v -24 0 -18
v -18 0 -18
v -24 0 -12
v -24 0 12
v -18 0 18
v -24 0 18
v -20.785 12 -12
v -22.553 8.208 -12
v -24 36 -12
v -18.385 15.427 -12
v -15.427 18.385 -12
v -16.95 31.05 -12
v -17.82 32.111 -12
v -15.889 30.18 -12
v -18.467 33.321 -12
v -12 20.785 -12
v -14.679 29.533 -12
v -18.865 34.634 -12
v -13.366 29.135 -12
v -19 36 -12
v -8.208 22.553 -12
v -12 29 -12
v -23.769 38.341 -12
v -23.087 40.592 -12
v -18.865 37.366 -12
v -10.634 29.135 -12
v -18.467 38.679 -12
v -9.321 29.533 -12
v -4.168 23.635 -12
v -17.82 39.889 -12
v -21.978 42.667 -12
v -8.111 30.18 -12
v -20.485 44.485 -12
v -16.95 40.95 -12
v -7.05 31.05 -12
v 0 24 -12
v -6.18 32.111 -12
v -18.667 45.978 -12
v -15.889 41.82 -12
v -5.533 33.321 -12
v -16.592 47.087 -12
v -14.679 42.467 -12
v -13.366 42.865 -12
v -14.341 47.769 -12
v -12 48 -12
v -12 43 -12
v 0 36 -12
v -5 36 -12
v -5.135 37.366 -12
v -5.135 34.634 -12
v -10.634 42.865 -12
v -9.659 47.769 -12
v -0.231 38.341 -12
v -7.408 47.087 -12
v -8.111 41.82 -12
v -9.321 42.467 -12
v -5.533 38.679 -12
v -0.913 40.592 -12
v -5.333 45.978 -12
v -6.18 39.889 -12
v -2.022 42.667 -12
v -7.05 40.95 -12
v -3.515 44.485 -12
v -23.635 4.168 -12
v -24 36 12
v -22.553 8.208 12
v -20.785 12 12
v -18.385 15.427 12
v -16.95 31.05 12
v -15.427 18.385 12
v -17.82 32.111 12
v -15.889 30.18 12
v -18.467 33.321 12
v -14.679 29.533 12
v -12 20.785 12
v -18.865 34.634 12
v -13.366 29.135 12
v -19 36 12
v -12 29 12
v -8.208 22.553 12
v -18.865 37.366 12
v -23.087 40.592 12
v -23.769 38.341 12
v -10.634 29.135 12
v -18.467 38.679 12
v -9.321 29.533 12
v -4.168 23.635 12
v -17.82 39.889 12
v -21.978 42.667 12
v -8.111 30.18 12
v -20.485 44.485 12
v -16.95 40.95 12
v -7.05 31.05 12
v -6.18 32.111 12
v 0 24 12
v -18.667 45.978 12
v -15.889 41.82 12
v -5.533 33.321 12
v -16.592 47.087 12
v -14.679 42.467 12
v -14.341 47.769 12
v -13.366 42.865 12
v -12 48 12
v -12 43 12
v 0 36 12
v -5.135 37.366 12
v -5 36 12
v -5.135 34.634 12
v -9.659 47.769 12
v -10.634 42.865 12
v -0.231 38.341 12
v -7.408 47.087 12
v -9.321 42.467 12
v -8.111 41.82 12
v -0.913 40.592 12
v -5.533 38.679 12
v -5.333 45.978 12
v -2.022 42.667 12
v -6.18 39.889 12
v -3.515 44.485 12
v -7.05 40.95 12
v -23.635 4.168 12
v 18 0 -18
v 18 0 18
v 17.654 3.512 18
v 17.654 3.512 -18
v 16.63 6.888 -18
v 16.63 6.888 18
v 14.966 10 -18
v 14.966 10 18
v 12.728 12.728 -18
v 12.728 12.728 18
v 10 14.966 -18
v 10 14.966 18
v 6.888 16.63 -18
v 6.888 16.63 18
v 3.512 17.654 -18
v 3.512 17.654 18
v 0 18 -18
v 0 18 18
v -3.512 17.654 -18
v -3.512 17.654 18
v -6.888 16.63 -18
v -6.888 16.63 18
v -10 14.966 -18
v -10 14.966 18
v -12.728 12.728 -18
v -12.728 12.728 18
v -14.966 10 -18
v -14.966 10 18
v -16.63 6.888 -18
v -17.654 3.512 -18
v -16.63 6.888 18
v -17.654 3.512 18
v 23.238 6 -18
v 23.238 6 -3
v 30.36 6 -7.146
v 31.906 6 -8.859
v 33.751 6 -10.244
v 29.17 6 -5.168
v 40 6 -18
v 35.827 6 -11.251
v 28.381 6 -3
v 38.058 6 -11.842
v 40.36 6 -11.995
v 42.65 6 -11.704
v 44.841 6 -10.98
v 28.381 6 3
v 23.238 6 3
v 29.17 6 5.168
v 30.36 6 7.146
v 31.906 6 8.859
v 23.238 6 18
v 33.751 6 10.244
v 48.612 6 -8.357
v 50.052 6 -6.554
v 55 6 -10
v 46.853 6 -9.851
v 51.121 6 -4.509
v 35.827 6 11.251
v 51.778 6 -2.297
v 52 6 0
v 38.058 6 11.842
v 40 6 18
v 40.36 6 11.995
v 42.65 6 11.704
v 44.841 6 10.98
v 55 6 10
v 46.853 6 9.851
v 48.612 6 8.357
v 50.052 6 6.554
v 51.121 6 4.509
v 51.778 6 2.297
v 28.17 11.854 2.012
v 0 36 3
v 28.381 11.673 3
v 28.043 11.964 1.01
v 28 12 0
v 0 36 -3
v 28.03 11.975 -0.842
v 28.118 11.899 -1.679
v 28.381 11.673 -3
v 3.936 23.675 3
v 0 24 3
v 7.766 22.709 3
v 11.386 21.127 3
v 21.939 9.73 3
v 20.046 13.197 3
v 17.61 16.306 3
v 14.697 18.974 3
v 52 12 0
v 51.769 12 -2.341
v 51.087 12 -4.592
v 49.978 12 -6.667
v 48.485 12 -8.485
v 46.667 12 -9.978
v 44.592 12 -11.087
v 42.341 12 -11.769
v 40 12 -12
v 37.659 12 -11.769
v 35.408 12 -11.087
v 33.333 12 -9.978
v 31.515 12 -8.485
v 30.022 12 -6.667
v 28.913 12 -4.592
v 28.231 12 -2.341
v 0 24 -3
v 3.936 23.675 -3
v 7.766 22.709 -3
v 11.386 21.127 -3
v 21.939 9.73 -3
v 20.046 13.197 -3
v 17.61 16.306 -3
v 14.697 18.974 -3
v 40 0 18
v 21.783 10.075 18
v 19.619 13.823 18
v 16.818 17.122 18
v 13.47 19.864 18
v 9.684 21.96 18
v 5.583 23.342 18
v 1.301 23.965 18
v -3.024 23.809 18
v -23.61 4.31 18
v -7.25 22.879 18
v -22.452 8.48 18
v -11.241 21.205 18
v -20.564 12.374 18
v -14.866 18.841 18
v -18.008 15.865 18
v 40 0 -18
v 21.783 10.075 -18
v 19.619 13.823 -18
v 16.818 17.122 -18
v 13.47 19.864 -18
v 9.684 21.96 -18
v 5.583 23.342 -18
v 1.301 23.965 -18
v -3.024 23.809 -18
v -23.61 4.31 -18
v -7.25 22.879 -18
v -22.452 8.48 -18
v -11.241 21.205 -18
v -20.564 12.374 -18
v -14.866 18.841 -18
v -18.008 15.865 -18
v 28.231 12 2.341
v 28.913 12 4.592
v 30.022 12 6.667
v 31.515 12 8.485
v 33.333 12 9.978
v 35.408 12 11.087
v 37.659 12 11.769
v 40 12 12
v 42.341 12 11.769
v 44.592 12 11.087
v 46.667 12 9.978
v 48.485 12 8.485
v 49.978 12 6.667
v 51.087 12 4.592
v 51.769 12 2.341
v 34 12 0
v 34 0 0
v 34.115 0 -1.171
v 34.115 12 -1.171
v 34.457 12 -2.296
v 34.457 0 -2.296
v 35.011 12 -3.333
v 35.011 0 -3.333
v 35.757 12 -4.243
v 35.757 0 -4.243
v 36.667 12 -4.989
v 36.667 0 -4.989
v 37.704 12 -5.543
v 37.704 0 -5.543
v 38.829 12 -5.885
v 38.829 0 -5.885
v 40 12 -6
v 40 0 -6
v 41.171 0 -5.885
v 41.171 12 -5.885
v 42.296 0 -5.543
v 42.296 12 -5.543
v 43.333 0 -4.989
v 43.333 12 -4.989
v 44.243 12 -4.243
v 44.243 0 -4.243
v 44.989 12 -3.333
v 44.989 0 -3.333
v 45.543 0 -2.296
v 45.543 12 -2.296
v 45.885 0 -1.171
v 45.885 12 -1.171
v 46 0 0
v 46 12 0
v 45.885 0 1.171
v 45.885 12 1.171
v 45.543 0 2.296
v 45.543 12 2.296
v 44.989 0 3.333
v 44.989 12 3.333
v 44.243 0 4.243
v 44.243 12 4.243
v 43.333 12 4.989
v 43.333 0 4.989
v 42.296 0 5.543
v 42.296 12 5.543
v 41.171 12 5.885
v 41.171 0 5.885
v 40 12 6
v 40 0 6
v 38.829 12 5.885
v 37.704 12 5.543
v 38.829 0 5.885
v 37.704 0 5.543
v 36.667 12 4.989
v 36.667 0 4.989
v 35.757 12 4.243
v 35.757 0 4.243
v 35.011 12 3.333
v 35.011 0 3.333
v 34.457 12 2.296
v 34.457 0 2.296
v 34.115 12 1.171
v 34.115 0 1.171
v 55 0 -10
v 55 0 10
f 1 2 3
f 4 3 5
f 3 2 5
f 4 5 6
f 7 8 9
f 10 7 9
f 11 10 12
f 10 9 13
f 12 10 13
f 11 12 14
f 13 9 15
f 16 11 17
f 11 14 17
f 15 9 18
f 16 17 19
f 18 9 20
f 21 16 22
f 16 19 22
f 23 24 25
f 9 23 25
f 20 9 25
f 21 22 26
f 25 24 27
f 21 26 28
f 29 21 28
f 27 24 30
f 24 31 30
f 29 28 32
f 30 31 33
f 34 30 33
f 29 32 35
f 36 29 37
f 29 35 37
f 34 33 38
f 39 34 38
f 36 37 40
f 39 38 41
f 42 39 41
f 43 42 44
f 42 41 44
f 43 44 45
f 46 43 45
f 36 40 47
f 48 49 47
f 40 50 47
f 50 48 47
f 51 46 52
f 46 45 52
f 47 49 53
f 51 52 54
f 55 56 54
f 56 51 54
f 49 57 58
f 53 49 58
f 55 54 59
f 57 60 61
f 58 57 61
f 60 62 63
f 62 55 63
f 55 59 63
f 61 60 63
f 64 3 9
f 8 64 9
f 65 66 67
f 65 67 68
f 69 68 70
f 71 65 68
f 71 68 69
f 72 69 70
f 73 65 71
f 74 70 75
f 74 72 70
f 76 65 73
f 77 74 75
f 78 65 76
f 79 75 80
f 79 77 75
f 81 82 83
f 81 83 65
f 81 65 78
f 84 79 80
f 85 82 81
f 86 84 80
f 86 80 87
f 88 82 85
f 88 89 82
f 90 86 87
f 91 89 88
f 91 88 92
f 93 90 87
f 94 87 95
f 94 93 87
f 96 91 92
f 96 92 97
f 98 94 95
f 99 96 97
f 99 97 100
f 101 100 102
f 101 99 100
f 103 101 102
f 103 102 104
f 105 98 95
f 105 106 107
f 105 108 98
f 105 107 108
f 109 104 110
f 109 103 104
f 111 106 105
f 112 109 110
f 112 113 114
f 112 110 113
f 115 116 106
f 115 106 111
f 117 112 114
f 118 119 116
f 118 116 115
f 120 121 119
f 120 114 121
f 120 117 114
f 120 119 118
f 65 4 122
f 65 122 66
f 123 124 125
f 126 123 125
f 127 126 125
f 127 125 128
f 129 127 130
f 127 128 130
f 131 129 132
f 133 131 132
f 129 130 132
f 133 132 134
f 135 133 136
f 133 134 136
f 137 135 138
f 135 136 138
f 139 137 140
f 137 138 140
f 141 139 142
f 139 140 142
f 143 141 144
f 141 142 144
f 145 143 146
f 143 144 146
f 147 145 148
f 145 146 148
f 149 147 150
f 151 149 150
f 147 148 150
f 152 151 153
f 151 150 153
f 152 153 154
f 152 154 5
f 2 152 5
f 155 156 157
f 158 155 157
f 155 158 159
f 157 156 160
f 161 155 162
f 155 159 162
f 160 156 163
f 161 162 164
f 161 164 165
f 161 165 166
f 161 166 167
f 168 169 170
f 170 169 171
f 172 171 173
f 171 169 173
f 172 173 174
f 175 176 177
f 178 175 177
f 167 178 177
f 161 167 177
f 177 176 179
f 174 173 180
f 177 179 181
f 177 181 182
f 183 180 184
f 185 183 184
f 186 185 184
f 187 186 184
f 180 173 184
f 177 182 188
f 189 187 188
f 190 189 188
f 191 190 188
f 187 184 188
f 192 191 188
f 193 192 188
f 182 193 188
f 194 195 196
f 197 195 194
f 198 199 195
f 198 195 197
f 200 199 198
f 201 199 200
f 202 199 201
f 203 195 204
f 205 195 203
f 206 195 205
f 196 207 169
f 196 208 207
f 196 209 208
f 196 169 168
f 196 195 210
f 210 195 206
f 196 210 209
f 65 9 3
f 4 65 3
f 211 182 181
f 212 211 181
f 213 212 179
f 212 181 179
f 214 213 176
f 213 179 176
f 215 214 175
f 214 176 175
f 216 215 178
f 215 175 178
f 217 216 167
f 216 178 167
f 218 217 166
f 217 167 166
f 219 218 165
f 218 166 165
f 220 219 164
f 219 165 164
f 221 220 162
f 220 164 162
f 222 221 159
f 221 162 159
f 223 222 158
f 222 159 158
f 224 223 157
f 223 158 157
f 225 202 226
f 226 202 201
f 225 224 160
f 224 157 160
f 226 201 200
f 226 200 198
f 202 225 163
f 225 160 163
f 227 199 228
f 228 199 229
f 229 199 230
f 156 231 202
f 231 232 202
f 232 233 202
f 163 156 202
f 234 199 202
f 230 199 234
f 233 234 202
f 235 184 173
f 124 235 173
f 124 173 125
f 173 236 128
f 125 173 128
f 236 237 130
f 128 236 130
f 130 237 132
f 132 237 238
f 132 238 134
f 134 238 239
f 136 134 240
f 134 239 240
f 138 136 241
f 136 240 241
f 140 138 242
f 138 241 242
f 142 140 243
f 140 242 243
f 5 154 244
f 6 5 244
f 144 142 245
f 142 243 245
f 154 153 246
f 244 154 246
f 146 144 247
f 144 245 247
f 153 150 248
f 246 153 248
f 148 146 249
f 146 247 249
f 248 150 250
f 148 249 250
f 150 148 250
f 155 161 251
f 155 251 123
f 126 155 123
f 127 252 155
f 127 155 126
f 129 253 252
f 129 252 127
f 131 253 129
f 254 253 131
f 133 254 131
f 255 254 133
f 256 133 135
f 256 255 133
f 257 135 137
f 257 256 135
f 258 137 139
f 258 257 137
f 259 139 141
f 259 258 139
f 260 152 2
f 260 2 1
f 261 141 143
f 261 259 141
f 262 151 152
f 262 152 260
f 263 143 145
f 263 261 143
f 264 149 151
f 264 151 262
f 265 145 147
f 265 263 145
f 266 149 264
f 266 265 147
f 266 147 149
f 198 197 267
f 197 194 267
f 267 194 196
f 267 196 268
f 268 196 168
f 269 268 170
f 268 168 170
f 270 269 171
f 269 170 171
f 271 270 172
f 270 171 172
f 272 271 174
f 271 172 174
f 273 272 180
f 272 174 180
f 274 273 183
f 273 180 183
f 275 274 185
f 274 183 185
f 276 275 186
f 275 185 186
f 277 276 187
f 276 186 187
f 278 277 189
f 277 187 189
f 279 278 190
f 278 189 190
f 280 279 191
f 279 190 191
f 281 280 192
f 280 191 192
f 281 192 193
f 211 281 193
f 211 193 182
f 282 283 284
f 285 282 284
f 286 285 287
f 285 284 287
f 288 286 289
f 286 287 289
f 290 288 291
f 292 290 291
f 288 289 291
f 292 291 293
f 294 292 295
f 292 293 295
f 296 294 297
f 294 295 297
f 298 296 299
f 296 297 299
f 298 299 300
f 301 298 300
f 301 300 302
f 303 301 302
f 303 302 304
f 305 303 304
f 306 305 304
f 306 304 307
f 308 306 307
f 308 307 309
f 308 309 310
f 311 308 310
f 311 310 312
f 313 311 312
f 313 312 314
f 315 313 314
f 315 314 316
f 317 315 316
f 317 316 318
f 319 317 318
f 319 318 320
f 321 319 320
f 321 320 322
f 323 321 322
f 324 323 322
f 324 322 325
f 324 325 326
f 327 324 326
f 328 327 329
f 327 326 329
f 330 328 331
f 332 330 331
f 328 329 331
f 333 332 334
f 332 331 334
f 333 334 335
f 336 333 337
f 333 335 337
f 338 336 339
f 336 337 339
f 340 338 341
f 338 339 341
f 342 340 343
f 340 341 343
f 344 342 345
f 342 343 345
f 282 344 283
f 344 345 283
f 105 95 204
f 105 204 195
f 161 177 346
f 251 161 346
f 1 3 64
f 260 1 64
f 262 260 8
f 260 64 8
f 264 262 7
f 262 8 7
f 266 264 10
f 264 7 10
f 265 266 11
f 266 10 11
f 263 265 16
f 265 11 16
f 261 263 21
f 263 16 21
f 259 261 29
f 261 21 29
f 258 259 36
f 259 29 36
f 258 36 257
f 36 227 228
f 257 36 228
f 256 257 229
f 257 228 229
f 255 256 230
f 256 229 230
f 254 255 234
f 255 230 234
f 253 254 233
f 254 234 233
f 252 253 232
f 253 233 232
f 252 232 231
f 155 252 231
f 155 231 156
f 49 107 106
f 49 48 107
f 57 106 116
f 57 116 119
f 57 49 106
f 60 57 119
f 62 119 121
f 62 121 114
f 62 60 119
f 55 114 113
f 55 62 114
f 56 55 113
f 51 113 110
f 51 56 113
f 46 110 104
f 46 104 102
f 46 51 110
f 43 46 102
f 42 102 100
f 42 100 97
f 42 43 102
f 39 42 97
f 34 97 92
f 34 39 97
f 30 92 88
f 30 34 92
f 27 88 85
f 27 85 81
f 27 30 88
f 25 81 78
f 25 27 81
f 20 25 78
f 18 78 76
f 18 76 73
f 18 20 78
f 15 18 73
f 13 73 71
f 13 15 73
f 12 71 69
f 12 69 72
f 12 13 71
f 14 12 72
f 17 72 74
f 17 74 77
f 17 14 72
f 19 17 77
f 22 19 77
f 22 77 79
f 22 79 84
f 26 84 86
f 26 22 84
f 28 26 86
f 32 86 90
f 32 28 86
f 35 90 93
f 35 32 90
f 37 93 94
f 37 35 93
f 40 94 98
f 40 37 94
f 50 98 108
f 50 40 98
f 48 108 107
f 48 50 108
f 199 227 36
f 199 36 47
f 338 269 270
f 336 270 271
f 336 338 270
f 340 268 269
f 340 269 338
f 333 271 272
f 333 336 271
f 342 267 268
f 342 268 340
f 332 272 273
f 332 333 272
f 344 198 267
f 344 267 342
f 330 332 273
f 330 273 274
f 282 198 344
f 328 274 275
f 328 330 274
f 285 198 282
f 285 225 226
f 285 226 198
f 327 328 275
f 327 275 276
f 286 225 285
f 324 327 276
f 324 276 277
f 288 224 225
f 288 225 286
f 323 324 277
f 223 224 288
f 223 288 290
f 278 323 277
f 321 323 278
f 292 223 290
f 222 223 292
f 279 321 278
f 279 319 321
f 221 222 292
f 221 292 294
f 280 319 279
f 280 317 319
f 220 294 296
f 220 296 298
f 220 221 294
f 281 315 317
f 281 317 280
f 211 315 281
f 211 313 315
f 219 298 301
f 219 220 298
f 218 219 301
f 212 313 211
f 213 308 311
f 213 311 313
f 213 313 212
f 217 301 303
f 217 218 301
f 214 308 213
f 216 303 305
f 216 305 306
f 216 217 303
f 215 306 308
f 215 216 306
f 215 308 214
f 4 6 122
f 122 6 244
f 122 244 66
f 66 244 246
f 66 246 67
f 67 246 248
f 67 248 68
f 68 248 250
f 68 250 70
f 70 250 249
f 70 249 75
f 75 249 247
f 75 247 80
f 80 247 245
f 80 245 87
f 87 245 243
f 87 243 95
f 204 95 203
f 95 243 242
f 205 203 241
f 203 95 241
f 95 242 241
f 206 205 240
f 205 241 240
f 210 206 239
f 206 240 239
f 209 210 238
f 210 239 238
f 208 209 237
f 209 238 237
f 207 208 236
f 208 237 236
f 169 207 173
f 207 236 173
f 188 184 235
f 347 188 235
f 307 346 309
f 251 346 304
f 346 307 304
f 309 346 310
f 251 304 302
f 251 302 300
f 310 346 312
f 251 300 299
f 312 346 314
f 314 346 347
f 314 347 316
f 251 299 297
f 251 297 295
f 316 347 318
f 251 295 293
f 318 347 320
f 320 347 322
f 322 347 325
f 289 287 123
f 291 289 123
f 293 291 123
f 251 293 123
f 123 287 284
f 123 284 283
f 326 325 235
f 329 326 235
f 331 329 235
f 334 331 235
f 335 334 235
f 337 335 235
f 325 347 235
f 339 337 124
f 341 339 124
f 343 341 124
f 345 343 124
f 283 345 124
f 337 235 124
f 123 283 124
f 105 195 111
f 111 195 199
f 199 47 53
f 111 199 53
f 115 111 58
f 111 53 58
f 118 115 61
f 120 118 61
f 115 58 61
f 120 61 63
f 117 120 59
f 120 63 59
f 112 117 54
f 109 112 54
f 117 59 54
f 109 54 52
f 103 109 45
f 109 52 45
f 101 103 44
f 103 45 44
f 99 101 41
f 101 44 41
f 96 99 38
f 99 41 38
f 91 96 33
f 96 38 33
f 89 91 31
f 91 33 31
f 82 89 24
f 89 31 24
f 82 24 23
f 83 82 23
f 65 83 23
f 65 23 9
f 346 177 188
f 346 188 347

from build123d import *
from build123d.topology import SkipClean

# Parameters (mm, degrees)
BOSS_EXTRUDE1_DEPTH        = 18
SKETCH1_3_R                = 12
SKETCH1_3_R_2              = 7
BOSS_EXTRUDE2_DEPTH        = 12
SKETCH2_R                  = 12
BOSS_EXTRUDE3_DEPTH        = 6
RIB1_REACH                 = 77.186
SKETCH3_WALL_W             = 189.251047722
SKETCH3_WALL_H             = 6
CHAMFER1_SIZE              = 8
CHAMFER1_SIZE2             = 15
CHAMFER2_SIZE              = 15
CHAMFER2_SIZE2             = 8
F_12_0MM_DOWEL_HOLE1_D     = 12
F_12_0MM_DOWEL_HOLE1_DEPTH = 30
F_12_0MM_DOWEL_HOLE1_TIP   = 3.605163714


with BuildPart() as part:
    # Sketch1 → Boss-Extrude1 (new, symmetric)
    with BuildSketch(Plane.XY):
        with BuildLine():
            ThreePointArc((18, 0), (0, 18), (-18, 0))
            Line((-18, 0), (-24, 0))
            ThreePointArc((-24, 0), (-3.02410302, 23.80871271), (23.237900077, 6))
            Line((23.237900077, 6), (55, 6))
            Line((55, 6), (55, 0))
            Line((55, 0), (24, 0))
            Line((24, 0), (18, 0))
        make_face()
    extrude(amount=BOSS_EXTRUDE1_DEPTH, both=True)

    # Sketch1<3> → Boss-Extrude2 (add, symmetric)
    # profile 1 of 2: a face of its own
    with BuildSketch(Plane.XY):
        with BuildLine():
            Line((-24, 36), (-24, 0))
            ThreePointArc((-24, 0), (-16.970562748, 16.970562748), (0, 24))
            Line((0, 24), (0, 36))
            ThreePointArc((0, 36), (-12, 24), (-24, 36))
        make_face()
    # profile 2 of 2: a face of its own
    with BuildSketch(Plane.XY):
        with Locations((-12, 36)):
            Circle(SKETCH1_3_R)
        with Locations((-12, 36)):
            Circle(SKETCH1_3_R_2, mode=Mode.SUBTRACT)
    extrude(amount=BOSS_EXTRUDE2_DEPTH, both=True)

    # Sketch2 → Boss-Extrude3 (add)
    with SkipClean():  # the faces are left unmerged after this step: merging them gives an invalid solid
        with BuildSketch(Plane(origin=(0, 6, 0), x_dir=(1, 0, 0), z_dir=(0, 1, 0))):
            with Locations((40, 0)):
                Circle(SKETCH2_R)
        extrude(amount=BOSS_EXTRUDE3_DEPTH)
    add(part.part.scale(1), mode=Mode.REPLACE)  # the faces are merged on a copy

    # Sketch3 wall → Rib1 (add, up to next)
    with BuildSketch(Plane(origin=(14, 24, 0), x_dir=(0.759256602365, -0.650791373456, 0), z_dir=(0.650791373456, 0.759256602365, 0)), mode=Mode.PRIVATE) as rib1_sk1:
        Rectangle(SKETCH3_WALL_W, SKETCH3_WALL_H)
    rib1_tool1 = extrude(rib1_sk1.sketch, amount=-RIB1_REACH, mode=Mode.PRIVATE) - part.part
    add(rib1_tool1.solids().sort_by_distance((14, 24, 0))[0])

    # Chamfer1
    chamfer1_edges = [part.edges().sort_by_distance(p)[0] for p in [
        (55, 3, 18),
    ]]
    chamfer1_side = [part.faces().sort_by_distance(p)[0] for p in [
        (55, 3, 0),
    ]]
    chamfer(chamfer1_edges, length=CHAMFER1_SIZE, length2=CHAMFER1_SIZE2, reference=chamfer1_side[0])

    # Chamfer2
    chamfer2_edges = [part.edges().sort_by_distance(p)[0] for p in [
        (55, 3, -18),
    ]]
    chamfer2_side = [part.faces().sort_by_distance(p)[0] for p in [
        (39.118950039, 5.174348742, -18),
    ]]
    chamfer(chamfer2_edges, length=CHAMFER2_SIZE, length2=CHAMFER2_SIZE2, reference=chamfer2_side[0])

    # Ø12.0mm Dowel Hole1
    with Locations(Plane(origin=(40, 12, 0), x_dir=(1, 0, 0), z_dir=(0, 1, 0))):
        with Locations((0, 0)):
            Hole(F_12_0MM_DOWEL_HOLE1_D / 2, depth=F_12_0MM_DOWEL_HOLE1_DEPTH)
            with Locations((0, 0, -(F_12_0MM_DOWEL_HOLE1_DEPTH + F_12_0MM_DOWEL_HOLE1_TIP / 2))):  # 118° drill point
                Cone(0, F_12_0MM_DOWEL_HOLE1_D / 2, F_12_0MM_DOWEL_HOLE1_TIP, mode=Mode.SUBTRACT)


solid = part.part
